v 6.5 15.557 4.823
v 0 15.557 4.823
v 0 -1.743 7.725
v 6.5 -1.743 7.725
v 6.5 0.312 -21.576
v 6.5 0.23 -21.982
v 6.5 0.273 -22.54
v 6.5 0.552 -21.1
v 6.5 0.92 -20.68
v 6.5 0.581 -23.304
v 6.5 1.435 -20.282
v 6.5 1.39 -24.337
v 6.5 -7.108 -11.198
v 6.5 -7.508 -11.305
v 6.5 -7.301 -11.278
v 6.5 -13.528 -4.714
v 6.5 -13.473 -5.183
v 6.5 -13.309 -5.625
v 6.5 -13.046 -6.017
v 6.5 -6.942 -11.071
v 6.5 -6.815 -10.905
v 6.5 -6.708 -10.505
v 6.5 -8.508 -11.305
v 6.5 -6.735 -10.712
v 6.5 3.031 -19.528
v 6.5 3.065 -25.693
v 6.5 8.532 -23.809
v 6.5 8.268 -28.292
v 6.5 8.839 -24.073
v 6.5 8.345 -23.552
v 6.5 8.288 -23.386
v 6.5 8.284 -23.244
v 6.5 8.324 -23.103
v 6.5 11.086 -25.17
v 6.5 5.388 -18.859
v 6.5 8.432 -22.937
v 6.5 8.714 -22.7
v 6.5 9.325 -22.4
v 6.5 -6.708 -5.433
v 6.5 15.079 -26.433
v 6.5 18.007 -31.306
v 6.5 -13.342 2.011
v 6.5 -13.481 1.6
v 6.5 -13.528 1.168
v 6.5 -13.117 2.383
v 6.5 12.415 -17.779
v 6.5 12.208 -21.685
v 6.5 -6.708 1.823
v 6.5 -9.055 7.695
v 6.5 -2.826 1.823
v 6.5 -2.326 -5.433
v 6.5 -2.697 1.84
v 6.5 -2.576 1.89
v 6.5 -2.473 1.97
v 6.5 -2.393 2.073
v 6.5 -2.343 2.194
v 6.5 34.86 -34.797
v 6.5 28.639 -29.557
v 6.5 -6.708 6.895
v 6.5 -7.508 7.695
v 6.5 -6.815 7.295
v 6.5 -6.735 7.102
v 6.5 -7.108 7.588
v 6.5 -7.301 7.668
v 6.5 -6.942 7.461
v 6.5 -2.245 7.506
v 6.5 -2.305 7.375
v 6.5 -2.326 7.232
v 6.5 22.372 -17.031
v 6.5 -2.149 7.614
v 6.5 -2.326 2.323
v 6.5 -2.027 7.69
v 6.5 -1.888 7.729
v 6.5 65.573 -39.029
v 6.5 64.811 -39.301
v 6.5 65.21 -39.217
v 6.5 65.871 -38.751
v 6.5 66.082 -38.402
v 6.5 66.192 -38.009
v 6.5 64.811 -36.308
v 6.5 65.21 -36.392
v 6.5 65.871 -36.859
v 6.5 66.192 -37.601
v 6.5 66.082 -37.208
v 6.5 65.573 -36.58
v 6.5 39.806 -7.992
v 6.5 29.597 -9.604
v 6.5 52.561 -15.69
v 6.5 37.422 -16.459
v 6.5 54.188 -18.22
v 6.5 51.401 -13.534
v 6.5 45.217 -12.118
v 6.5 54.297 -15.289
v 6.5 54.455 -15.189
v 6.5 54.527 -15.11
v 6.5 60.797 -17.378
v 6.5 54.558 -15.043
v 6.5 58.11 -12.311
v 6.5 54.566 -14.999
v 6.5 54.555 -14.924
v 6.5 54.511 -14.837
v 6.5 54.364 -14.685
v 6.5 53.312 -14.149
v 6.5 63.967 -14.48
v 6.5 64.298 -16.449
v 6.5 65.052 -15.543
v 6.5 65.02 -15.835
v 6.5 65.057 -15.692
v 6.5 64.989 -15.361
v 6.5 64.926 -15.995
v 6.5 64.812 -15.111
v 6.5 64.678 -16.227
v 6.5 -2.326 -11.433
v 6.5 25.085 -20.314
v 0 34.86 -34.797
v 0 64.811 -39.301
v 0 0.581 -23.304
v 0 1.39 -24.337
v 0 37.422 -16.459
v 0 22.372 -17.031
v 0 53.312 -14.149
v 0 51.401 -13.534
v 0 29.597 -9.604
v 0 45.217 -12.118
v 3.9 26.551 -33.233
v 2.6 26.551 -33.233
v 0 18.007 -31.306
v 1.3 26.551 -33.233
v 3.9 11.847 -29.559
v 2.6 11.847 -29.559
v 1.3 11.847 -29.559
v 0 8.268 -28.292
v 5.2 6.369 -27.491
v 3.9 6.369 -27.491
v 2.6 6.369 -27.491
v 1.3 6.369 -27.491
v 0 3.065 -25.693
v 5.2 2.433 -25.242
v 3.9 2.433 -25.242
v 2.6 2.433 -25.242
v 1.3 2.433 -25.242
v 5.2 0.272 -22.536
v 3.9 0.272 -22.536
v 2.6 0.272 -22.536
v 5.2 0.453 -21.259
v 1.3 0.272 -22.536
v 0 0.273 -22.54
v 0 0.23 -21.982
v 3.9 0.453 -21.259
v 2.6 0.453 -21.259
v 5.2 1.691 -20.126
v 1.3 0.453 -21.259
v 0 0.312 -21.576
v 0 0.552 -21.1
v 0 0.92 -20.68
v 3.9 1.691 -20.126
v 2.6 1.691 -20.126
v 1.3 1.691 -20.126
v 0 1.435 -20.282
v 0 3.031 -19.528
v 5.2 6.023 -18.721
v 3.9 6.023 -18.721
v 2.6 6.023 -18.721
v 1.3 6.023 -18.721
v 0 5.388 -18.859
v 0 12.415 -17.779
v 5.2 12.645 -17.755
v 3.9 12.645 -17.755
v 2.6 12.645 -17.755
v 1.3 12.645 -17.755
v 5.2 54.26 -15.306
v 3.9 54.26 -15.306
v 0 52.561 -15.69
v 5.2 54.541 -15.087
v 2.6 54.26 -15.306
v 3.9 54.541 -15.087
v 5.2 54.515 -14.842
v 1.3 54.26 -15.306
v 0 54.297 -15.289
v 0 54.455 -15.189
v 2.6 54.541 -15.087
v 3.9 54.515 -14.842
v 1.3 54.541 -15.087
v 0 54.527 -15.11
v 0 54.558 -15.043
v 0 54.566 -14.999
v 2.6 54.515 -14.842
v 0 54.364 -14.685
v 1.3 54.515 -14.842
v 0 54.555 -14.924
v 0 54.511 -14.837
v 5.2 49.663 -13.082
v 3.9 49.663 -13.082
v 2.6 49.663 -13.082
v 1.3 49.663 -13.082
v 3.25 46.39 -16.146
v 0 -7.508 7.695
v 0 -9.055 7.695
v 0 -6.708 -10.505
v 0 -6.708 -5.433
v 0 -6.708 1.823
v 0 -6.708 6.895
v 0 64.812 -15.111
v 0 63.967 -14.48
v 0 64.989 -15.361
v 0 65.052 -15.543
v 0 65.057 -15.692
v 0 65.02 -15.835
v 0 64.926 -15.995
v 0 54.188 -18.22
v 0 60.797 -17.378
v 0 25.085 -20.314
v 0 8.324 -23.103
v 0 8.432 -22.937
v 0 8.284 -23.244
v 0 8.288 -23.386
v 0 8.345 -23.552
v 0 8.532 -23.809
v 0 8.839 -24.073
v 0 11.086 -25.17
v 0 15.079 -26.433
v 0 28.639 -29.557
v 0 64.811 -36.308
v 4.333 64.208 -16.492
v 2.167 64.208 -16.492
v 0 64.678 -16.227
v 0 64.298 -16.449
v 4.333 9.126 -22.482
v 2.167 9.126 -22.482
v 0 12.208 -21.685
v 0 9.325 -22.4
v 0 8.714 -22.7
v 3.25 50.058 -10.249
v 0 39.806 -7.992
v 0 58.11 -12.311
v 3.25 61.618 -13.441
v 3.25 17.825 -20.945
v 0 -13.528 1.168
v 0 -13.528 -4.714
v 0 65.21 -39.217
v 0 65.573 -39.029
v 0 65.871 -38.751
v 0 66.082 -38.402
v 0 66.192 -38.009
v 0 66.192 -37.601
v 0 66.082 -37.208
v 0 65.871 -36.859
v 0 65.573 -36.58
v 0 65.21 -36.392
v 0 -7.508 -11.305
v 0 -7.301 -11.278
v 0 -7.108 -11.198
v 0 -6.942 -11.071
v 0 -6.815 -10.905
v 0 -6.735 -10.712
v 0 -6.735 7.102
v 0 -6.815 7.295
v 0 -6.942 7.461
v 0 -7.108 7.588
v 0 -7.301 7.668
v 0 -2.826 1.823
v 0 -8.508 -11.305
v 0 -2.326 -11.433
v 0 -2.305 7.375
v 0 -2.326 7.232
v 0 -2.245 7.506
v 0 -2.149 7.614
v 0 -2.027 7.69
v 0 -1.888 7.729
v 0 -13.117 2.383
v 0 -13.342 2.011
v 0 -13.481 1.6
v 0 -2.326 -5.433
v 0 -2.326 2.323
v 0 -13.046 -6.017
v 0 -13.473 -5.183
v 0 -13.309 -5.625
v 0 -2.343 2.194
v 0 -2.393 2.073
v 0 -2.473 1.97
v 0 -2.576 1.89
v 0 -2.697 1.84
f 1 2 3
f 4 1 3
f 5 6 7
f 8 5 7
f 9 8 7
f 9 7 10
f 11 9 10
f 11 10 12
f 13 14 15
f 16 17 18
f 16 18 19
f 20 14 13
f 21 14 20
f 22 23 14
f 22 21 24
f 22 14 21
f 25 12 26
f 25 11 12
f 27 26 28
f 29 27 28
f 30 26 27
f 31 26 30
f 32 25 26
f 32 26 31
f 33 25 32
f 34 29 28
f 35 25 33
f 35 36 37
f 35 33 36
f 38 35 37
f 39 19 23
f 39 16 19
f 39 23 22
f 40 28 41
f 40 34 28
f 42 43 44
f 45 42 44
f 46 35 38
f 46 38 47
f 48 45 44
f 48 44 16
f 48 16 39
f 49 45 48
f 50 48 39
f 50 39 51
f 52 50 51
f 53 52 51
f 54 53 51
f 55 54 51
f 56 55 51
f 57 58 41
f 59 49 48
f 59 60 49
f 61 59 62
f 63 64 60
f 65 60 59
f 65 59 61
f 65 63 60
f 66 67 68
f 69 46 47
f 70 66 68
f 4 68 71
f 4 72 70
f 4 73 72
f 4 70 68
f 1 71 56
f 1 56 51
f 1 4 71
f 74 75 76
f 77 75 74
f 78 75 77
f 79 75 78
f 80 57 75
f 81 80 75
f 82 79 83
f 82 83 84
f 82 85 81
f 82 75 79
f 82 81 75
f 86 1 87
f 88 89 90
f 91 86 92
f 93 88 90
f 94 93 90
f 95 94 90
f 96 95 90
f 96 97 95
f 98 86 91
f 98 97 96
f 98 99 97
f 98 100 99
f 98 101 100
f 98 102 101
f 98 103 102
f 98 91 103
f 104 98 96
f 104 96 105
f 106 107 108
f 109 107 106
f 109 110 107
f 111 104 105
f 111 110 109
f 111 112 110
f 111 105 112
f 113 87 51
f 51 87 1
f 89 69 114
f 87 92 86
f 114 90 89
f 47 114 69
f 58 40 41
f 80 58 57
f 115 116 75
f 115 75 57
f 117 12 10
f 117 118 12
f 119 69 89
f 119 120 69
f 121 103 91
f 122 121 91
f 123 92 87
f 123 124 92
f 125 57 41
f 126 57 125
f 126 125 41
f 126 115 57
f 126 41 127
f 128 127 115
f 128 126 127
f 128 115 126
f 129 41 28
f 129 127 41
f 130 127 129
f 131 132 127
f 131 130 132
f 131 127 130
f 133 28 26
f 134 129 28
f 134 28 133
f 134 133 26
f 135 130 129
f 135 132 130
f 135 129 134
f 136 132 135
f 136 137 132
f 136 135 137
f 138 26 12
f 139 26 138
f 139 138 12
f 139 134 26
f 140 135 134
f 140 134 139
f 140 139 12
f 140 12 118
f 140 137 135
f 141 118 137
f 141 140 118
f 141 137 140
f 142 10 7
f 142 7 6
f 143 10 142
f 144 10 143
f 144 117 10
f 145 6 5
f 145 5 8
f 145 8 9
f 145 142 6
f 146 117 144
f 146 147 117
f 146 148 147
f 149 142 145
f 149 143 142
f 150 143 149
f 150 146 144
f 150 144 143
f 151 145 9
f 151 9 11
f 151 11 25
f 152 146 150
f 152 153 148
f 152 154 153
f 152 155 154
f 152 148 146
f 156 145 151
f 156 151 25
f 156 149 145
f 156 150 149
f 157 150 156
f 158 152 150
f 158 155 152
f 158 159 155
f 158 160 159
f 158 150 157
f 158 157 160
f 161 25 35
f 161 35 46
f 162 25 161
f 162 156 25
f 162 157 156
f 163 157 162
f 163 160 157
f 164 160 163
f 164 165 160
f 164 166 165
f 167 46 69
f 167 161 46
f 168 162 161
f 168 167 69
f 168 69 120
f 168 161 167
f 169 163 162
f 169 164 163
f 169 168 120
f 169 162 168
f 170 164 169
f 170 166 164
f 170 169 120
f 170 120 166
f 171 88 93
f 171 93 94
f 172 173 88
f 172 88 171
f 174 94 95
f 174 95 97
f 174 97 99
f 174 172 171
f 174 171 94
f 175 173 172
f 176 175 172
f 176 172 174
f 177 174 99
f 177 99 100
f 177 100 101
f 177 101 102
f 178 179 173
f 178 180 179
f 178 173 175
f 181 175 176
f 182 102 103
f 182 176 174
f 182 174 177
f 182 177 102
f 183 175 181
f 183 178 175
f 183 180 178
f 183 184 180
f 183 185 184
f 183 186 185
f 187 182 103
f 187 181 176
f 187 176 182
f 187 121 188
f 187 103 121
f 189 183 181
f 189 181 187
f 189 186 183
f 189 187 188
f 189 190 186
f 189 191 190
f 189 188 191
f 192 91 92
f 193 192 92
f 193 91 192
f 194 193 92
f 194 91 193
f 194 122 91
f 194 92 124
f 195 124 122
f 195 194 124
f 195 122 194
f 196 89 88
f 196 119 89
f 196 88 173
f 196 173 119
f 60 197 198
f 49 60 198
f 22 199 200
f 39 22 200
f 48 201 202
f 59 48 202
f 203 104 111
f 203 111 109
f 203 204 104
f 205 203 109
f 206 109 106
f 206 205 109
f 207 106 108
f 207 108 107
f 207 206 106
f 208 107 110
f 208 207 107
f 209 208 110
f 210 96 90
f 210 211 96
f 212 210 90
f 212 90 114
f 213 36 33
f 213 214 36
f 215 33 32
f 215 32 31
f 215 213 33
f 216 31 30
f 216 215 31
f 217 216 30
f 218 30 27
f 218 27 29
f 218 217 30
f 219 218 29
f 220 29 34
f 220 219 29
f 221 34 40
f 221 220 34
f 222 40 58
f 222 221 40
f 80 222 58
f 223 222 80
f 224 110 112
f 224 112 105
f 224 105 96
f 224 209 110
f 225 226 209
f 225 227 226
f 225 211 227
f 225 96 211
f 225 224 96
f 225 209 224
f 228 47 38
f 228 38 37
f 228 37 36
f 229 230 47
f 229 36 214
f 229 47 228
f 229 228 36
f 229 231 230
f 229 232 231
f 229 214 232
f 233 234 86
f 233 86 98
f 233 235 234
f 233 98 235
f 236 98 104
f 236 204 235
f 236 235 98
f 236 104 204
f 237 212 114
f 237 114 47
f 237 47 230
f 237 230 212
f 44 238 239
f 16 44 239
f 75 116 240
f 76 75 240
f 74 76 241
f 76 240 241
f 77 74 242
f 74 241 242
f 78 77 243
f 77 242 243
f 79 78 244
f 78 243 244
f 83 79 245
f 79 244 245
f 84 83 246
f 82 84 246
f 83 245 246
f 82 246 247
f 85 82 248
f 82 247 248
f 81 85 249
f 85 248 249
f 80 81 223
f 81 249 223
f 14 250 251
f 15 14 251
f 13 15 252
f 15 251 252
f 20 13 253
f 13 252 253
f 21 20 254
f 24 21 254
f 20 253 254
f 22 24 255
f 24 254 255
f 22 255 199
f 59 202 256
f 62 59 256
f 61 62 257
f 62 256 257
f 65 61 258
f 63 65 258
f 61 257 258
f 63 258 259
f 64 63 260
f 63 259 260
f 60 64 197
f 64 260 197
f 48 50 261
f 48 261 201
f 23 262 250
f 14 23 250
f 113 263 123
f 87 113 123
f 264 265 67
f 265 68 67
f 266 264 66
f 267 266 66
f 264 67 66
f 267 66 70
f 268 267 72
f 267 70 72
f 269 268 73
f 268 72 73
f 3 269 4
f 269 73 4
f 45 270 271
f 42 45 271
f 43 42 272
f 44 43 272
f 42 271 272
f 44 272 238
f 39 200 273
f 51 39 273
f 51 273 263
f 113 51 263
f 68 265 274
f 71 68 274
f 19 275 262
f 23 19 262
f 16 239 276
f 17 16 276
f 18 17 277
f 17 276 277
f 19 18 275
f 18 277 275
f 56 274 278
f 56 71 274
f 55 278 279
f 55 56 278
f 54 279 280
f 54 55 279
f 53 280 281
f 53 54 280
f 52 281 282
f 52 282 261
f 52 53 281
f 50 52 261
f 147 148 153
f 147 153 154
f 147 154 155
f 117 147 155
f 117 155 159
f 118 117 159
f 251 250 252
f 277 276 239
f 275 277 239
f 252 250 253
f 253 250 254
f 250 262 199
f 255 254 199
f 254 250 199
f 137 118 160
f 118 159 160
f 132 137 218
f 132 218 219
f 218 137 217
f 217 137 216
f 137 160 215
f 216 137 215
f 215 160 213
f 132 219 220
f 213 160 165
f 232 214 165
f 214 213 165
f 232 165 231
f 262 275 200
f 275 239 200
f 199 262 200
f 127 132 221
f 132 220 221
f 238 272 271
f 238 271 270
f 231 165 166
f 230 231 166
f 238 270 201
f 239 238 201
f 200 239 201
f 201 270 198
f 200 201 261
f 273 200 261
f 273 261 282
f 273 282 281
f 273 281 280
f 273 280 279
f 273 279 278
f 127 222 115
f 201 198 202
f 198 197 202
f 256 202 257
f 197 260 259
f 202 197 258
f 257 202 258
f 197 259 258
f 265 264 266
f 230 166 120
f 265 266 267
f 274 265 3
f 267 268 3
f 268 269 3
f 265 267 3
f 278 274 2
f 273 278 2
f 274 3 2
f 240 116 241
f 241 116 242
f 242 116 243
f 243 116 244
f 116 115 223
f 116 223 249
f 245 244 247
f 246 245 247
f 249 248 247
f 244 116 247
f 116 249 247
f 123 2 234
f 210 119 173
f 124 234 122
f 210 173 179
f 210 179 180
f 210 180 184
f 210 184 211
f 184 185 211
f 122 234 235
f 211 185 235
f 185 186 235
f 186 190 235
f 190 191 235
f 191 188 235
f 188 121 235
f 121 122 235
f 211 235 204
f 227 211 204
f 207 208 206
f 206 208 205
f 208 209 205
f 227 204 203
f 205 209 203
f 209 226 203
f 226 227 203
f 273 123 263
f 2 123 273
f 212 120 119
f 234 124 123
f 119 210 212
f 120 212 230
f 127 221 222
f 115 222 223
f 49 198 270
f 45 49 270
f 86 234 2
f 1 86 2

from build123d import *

# Parameters (mm, degrees)
F1_DEPTH = 6.5
F2_R     = 0.5


with BuildPart() as f1:
    # F0 (on Right) → F1 (new body)
    with BuildSketch(Plane.YZ):
        with BuildLine():
            Line((-2.3261857192, 7.8231747373), (-2.3261857192, 1.8231747373))
            Line((-2.3261857192, 1.8231747373), (-6.7077510927, 1.8231747373))
            Line((-6.7077510927, 1.8231747373), (-6.7077510927, 6.8951029659))
            ThreePointArc((-6.7077510927, 6.8951029659), (-6.9420656678, 7.4607883909), (-7.5077510927, 7.6951029659))
            Line((-7.5077510927, 7.6951029659), (-9.0546131166, 7.6951029659))
            Line((-9.0546131166, 7.6951029659), (-13.1169929958, 2.3829442588))
            ThreePointArc((-13.1169929958, 2.3829442588), (-13.4226828722, 1.8093478454), (-13.5282976587, 1.1680174602))
            Line((-13.5282976587, 1.1680174602), (-13.5282976587, -4.714347789))
            ThreePointArc((-13.5282976587, -4.714347789), (-13.4038536617, -5.40881858), (-13.0460079791, -6.01686665))
            Line((-13.0460079791, -6.01686665), (-8.5077510927, -11.3048970341))
            Line((-8.5077510927, -11.3048970341), (-7.5077510927, -11.3048970341))
            ThreePointArc((-7.5077510927, -11.3048970341), (-6.9420656678, -11.070582459), (-6.7077510927, -10.5048970341))
            Line((-6.7077510927, -10.5048970341), (-6.7077510927, -5.4329688054))
            Line((-6.7077510927, -5.4329688054), (-2.3261857192, -5.4329688054))
            add(Edge.make_bspline(
                [(29.5967873893, -9.603761956), (19.9915875977, -8.2575789777), (8.8285316572, -6.9078858502), (-2.3261857192, -5.4329688054)],
                knots=[0.854717852, 0.854717852, 0.854717852, 0.854717852, 1, 1, 1, 1], degree=3))
            add(Edge.make_bspline(
                [(64.8109703191, -39.3010818437), (37.7093056162, -35.6094605608), (2.9928587329, -30.3297260774), (-3.3768708565, -15.2714692161), (63.2058288641, -17.5013760989), (49.4841345426, -12.6487868731), (37.7129114005, -10.741248758), (29.5967873893, -9.603761956)],
                knots=[0, 0, 0, 0, 0.2956750024, 0.3797452222, 0.6483988176, 0.731958518, 0.854717852, 0.854717852, 0.854717852, 0.854717852], degree=3))
            ThreePointArc((64.8109703191, -39.3010818437), (66.206283861, -37.8047393877), (64.8109703191, -36.3083969317))
            add(Edge.make_bspline(
                [(39.8057358281, -7.9922291512), (56.820708357, -11.5700774026), (85.8899906987, -19.167635592), (-27.804311403, -20.0315678799), (33.7854768957, -30.6820395077), (64.8109703191, -36.3083969317)],
                knots=[0.1171792834, 0.1171792834, 0.1171792834, 0.1171792834, 0.3345486768, 0.664370096, 1, 1, 1, 1], degree=3))
            Line((39.8057358281, -7.9922291512), (15.5565273017, 4.8231747373))
            Line((15.5565273017, 4.8231747373), (-2.3261857192, 7.8231747373))
        make_face()
        with BuildLine():
            Line((-2.3261857192, -11.4329688054), (29.5967873893, -9.603761956))
            add(Edge.make_bspline(
                [(29.5967873893, -9.603761956), (19.9915875977, -8.2575789777), (8.8285316572, -6.9078858502), (-2.3261857192, -5.4329688054)],
                knots=[0.854717852, 0.854717852, 0.854717852, 0.854717852, 1, 1, 1, 1], degree=3))
            Line((-2.3261857192, -5.4329688054), (-2.3261857192, -11.4329688054))
        make_face()
    extrude(amount=F1_DEPTH)

    # F2
    f2_edges = [f1.edges().sort_by_distance(p)[0] for p in [
        (3.25, -2.326186, 7.823175),
        (3.25, -2.326186, 1.823175),
    ]]
    fillet(f2_edges, radius=F2_R)


solid = f1.part
